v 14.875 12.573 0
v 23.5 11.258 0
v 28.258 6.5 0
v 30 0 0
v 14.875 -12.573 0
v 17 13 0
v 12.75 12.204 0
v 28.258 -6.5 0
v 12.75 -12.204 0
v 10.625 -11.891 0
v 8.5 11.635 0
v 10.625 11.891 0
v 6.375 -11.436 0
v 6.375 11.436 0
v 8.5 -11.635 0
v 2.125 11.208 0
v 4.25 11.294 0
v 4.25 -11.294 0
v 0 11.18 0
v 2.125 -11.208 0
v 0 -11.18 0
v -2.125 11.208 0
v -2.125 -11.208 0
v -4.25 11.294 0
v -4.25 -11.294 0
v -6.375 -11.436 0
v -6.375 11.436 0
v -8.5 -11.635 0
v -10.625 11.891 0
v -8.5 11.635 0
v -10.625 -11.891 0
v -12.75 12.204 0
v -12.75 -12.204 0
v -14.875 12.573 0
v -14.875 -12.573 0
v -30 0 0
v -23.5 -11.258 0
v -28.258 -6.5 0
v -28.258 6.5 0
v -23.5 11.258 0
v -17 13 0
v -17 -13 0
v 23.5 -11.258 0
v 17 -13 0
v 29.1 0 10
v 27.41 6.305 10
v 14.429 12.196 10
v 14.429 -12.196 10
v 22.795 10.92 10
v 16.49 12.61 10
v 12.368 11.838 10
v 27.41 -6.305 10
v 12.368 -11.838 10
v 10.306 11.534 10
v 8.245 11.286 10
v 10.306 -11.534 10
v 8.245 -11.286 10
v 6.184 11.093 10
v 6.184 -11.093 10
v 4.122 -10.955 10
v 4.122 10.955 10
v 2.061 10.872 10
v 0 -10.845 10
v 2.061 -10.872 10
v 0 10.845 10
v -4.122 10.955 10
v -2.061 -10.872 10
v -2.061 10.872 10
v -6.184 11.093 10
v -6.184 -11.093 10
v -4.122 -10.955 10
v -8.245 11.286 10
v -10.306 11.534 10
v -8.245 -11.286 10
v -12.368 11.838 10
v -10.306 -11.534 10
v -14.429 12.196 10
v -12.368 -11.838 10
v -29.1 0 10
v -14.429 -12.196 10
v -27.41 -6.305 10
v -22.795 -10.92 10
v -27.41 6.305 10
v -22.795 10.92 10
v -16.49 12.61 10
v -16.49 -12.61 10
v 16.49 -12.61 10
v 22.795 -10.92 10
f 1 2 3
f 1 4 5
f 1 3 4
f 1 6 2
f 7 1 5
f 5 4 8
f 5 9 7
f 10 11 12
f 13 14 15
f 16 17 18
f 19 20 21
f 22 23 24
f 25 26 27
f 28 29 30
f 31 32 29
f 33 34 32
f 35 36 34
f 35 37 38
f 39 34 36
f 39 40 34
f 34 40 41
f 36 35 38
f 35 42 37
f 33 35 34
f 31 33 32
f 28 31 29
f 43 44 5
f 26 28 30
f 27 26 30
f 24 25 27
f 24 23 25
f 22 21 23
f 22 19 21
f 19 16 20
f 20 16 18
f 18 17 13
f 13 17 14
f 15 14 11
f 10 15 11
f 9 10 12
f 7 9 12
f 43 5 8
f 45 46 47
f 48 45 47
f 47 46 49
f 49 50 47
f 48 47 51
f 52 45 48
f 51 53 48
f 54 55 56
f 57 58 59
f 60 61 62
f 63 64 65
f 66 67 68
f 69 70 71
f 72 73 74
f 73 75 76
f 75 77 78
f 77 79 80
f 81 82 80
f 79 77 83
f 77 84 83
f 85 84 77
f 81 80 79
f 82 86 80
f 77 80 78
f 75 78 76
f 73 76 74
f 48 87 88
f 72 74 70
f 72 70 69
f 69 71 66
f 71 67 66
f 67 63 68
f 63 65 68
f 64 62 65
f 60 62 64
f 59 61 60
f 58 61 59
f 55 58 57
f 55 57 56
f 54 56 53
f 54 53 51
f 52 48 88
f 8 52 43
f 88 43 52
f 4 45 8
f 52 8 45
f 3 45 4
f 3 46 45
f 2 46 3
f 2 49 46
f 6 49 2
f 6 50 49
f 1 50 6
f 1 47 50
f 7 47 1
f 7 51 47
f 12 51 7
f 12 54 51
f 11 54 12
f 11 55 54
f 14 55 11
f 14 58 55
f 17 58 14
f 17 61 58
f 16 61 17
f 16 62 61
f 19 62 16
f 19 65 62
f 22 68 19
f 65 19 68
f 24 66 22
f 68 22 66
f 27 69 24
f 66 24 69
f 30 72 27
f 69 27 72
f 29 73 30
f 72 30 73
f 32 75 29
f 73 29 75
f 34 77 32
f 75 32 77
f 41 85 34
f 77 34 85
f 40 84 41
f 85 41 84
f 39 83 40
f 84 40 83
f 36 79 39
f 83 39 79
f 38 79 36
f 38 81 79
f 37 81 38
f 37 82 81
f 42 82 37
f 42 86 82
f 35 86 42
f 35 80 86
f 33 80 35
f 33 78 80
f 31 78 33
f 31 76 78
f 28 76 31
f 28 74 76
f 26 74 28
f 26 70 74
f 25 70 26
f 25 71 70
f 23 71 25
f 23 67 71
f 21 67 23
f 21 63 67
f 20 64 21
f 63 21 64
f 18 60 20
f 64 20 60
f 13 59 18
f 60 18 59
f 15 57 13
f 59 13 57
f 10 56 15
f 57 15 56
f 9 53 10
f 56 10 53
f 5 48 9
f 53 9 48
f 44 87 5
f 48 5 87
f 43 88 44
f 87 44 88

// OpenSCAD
$fn = 32;

// ----------------------------------------------------------------------
// Handle: 60 x 26 mm grip, 10 mm thick
// ----------------------------------------------------------------------

// --- parameters (mm) ---
length = 60;              // grip length
width = 26;               // grip width
thickness = 10;           // grip thickness
waist = 0.86;             // width factor at the middle
draft = 0.97;             // top face scale of the extrusion

/* ergonomic grip outline, closed spline-like polygon in the XY plane */
grip = [[-17, 13], [-14.875, 12.573], [-12.75, 12.204], [-10.625, 11.891], [-8.5, 11.635], [-6.375, 11.436], [-4.25, 11.294], [-2.125, 11.208], [0, 11.18], [2.125, 11.208], [4.25, 11.294], [6.375, 11.436], [8.5, 11.635], [10.625, 11.891], [12.75, 12.204], [14.875, 12.573], [17, 13], [23.5, 11.258], [28.258, 6.5], [30, 0], [28.258, -6.5], [23.5, -11.258], [17, -13], [17, -13], [14.875, -12.573], [12.75, -12.204], [10.625, -11.891], [8.5, -11.635], [6.375, -11.436], [4.25, -11.294], [2.125, -11.208], [0, -11.18], [-2.125, -11.208], [-4.25, -11.294], [-6.375, -11.436], [-8.5, -11.635], [-10.625, -11.891], [-12.75, -12.204], [-14.875, -12.573], [-17, -13], [-23.5, -11.258], [-28.258, -6.5], [-30, 0], [-28.258, 6.5], [-23.5, 11.258], [-17, 13]];

module grip_body() {
  linear_extrude(height = thickness, scale = draft) polygon(grip);
}

difference() {
  union() {
    grip_body();
  }
}
